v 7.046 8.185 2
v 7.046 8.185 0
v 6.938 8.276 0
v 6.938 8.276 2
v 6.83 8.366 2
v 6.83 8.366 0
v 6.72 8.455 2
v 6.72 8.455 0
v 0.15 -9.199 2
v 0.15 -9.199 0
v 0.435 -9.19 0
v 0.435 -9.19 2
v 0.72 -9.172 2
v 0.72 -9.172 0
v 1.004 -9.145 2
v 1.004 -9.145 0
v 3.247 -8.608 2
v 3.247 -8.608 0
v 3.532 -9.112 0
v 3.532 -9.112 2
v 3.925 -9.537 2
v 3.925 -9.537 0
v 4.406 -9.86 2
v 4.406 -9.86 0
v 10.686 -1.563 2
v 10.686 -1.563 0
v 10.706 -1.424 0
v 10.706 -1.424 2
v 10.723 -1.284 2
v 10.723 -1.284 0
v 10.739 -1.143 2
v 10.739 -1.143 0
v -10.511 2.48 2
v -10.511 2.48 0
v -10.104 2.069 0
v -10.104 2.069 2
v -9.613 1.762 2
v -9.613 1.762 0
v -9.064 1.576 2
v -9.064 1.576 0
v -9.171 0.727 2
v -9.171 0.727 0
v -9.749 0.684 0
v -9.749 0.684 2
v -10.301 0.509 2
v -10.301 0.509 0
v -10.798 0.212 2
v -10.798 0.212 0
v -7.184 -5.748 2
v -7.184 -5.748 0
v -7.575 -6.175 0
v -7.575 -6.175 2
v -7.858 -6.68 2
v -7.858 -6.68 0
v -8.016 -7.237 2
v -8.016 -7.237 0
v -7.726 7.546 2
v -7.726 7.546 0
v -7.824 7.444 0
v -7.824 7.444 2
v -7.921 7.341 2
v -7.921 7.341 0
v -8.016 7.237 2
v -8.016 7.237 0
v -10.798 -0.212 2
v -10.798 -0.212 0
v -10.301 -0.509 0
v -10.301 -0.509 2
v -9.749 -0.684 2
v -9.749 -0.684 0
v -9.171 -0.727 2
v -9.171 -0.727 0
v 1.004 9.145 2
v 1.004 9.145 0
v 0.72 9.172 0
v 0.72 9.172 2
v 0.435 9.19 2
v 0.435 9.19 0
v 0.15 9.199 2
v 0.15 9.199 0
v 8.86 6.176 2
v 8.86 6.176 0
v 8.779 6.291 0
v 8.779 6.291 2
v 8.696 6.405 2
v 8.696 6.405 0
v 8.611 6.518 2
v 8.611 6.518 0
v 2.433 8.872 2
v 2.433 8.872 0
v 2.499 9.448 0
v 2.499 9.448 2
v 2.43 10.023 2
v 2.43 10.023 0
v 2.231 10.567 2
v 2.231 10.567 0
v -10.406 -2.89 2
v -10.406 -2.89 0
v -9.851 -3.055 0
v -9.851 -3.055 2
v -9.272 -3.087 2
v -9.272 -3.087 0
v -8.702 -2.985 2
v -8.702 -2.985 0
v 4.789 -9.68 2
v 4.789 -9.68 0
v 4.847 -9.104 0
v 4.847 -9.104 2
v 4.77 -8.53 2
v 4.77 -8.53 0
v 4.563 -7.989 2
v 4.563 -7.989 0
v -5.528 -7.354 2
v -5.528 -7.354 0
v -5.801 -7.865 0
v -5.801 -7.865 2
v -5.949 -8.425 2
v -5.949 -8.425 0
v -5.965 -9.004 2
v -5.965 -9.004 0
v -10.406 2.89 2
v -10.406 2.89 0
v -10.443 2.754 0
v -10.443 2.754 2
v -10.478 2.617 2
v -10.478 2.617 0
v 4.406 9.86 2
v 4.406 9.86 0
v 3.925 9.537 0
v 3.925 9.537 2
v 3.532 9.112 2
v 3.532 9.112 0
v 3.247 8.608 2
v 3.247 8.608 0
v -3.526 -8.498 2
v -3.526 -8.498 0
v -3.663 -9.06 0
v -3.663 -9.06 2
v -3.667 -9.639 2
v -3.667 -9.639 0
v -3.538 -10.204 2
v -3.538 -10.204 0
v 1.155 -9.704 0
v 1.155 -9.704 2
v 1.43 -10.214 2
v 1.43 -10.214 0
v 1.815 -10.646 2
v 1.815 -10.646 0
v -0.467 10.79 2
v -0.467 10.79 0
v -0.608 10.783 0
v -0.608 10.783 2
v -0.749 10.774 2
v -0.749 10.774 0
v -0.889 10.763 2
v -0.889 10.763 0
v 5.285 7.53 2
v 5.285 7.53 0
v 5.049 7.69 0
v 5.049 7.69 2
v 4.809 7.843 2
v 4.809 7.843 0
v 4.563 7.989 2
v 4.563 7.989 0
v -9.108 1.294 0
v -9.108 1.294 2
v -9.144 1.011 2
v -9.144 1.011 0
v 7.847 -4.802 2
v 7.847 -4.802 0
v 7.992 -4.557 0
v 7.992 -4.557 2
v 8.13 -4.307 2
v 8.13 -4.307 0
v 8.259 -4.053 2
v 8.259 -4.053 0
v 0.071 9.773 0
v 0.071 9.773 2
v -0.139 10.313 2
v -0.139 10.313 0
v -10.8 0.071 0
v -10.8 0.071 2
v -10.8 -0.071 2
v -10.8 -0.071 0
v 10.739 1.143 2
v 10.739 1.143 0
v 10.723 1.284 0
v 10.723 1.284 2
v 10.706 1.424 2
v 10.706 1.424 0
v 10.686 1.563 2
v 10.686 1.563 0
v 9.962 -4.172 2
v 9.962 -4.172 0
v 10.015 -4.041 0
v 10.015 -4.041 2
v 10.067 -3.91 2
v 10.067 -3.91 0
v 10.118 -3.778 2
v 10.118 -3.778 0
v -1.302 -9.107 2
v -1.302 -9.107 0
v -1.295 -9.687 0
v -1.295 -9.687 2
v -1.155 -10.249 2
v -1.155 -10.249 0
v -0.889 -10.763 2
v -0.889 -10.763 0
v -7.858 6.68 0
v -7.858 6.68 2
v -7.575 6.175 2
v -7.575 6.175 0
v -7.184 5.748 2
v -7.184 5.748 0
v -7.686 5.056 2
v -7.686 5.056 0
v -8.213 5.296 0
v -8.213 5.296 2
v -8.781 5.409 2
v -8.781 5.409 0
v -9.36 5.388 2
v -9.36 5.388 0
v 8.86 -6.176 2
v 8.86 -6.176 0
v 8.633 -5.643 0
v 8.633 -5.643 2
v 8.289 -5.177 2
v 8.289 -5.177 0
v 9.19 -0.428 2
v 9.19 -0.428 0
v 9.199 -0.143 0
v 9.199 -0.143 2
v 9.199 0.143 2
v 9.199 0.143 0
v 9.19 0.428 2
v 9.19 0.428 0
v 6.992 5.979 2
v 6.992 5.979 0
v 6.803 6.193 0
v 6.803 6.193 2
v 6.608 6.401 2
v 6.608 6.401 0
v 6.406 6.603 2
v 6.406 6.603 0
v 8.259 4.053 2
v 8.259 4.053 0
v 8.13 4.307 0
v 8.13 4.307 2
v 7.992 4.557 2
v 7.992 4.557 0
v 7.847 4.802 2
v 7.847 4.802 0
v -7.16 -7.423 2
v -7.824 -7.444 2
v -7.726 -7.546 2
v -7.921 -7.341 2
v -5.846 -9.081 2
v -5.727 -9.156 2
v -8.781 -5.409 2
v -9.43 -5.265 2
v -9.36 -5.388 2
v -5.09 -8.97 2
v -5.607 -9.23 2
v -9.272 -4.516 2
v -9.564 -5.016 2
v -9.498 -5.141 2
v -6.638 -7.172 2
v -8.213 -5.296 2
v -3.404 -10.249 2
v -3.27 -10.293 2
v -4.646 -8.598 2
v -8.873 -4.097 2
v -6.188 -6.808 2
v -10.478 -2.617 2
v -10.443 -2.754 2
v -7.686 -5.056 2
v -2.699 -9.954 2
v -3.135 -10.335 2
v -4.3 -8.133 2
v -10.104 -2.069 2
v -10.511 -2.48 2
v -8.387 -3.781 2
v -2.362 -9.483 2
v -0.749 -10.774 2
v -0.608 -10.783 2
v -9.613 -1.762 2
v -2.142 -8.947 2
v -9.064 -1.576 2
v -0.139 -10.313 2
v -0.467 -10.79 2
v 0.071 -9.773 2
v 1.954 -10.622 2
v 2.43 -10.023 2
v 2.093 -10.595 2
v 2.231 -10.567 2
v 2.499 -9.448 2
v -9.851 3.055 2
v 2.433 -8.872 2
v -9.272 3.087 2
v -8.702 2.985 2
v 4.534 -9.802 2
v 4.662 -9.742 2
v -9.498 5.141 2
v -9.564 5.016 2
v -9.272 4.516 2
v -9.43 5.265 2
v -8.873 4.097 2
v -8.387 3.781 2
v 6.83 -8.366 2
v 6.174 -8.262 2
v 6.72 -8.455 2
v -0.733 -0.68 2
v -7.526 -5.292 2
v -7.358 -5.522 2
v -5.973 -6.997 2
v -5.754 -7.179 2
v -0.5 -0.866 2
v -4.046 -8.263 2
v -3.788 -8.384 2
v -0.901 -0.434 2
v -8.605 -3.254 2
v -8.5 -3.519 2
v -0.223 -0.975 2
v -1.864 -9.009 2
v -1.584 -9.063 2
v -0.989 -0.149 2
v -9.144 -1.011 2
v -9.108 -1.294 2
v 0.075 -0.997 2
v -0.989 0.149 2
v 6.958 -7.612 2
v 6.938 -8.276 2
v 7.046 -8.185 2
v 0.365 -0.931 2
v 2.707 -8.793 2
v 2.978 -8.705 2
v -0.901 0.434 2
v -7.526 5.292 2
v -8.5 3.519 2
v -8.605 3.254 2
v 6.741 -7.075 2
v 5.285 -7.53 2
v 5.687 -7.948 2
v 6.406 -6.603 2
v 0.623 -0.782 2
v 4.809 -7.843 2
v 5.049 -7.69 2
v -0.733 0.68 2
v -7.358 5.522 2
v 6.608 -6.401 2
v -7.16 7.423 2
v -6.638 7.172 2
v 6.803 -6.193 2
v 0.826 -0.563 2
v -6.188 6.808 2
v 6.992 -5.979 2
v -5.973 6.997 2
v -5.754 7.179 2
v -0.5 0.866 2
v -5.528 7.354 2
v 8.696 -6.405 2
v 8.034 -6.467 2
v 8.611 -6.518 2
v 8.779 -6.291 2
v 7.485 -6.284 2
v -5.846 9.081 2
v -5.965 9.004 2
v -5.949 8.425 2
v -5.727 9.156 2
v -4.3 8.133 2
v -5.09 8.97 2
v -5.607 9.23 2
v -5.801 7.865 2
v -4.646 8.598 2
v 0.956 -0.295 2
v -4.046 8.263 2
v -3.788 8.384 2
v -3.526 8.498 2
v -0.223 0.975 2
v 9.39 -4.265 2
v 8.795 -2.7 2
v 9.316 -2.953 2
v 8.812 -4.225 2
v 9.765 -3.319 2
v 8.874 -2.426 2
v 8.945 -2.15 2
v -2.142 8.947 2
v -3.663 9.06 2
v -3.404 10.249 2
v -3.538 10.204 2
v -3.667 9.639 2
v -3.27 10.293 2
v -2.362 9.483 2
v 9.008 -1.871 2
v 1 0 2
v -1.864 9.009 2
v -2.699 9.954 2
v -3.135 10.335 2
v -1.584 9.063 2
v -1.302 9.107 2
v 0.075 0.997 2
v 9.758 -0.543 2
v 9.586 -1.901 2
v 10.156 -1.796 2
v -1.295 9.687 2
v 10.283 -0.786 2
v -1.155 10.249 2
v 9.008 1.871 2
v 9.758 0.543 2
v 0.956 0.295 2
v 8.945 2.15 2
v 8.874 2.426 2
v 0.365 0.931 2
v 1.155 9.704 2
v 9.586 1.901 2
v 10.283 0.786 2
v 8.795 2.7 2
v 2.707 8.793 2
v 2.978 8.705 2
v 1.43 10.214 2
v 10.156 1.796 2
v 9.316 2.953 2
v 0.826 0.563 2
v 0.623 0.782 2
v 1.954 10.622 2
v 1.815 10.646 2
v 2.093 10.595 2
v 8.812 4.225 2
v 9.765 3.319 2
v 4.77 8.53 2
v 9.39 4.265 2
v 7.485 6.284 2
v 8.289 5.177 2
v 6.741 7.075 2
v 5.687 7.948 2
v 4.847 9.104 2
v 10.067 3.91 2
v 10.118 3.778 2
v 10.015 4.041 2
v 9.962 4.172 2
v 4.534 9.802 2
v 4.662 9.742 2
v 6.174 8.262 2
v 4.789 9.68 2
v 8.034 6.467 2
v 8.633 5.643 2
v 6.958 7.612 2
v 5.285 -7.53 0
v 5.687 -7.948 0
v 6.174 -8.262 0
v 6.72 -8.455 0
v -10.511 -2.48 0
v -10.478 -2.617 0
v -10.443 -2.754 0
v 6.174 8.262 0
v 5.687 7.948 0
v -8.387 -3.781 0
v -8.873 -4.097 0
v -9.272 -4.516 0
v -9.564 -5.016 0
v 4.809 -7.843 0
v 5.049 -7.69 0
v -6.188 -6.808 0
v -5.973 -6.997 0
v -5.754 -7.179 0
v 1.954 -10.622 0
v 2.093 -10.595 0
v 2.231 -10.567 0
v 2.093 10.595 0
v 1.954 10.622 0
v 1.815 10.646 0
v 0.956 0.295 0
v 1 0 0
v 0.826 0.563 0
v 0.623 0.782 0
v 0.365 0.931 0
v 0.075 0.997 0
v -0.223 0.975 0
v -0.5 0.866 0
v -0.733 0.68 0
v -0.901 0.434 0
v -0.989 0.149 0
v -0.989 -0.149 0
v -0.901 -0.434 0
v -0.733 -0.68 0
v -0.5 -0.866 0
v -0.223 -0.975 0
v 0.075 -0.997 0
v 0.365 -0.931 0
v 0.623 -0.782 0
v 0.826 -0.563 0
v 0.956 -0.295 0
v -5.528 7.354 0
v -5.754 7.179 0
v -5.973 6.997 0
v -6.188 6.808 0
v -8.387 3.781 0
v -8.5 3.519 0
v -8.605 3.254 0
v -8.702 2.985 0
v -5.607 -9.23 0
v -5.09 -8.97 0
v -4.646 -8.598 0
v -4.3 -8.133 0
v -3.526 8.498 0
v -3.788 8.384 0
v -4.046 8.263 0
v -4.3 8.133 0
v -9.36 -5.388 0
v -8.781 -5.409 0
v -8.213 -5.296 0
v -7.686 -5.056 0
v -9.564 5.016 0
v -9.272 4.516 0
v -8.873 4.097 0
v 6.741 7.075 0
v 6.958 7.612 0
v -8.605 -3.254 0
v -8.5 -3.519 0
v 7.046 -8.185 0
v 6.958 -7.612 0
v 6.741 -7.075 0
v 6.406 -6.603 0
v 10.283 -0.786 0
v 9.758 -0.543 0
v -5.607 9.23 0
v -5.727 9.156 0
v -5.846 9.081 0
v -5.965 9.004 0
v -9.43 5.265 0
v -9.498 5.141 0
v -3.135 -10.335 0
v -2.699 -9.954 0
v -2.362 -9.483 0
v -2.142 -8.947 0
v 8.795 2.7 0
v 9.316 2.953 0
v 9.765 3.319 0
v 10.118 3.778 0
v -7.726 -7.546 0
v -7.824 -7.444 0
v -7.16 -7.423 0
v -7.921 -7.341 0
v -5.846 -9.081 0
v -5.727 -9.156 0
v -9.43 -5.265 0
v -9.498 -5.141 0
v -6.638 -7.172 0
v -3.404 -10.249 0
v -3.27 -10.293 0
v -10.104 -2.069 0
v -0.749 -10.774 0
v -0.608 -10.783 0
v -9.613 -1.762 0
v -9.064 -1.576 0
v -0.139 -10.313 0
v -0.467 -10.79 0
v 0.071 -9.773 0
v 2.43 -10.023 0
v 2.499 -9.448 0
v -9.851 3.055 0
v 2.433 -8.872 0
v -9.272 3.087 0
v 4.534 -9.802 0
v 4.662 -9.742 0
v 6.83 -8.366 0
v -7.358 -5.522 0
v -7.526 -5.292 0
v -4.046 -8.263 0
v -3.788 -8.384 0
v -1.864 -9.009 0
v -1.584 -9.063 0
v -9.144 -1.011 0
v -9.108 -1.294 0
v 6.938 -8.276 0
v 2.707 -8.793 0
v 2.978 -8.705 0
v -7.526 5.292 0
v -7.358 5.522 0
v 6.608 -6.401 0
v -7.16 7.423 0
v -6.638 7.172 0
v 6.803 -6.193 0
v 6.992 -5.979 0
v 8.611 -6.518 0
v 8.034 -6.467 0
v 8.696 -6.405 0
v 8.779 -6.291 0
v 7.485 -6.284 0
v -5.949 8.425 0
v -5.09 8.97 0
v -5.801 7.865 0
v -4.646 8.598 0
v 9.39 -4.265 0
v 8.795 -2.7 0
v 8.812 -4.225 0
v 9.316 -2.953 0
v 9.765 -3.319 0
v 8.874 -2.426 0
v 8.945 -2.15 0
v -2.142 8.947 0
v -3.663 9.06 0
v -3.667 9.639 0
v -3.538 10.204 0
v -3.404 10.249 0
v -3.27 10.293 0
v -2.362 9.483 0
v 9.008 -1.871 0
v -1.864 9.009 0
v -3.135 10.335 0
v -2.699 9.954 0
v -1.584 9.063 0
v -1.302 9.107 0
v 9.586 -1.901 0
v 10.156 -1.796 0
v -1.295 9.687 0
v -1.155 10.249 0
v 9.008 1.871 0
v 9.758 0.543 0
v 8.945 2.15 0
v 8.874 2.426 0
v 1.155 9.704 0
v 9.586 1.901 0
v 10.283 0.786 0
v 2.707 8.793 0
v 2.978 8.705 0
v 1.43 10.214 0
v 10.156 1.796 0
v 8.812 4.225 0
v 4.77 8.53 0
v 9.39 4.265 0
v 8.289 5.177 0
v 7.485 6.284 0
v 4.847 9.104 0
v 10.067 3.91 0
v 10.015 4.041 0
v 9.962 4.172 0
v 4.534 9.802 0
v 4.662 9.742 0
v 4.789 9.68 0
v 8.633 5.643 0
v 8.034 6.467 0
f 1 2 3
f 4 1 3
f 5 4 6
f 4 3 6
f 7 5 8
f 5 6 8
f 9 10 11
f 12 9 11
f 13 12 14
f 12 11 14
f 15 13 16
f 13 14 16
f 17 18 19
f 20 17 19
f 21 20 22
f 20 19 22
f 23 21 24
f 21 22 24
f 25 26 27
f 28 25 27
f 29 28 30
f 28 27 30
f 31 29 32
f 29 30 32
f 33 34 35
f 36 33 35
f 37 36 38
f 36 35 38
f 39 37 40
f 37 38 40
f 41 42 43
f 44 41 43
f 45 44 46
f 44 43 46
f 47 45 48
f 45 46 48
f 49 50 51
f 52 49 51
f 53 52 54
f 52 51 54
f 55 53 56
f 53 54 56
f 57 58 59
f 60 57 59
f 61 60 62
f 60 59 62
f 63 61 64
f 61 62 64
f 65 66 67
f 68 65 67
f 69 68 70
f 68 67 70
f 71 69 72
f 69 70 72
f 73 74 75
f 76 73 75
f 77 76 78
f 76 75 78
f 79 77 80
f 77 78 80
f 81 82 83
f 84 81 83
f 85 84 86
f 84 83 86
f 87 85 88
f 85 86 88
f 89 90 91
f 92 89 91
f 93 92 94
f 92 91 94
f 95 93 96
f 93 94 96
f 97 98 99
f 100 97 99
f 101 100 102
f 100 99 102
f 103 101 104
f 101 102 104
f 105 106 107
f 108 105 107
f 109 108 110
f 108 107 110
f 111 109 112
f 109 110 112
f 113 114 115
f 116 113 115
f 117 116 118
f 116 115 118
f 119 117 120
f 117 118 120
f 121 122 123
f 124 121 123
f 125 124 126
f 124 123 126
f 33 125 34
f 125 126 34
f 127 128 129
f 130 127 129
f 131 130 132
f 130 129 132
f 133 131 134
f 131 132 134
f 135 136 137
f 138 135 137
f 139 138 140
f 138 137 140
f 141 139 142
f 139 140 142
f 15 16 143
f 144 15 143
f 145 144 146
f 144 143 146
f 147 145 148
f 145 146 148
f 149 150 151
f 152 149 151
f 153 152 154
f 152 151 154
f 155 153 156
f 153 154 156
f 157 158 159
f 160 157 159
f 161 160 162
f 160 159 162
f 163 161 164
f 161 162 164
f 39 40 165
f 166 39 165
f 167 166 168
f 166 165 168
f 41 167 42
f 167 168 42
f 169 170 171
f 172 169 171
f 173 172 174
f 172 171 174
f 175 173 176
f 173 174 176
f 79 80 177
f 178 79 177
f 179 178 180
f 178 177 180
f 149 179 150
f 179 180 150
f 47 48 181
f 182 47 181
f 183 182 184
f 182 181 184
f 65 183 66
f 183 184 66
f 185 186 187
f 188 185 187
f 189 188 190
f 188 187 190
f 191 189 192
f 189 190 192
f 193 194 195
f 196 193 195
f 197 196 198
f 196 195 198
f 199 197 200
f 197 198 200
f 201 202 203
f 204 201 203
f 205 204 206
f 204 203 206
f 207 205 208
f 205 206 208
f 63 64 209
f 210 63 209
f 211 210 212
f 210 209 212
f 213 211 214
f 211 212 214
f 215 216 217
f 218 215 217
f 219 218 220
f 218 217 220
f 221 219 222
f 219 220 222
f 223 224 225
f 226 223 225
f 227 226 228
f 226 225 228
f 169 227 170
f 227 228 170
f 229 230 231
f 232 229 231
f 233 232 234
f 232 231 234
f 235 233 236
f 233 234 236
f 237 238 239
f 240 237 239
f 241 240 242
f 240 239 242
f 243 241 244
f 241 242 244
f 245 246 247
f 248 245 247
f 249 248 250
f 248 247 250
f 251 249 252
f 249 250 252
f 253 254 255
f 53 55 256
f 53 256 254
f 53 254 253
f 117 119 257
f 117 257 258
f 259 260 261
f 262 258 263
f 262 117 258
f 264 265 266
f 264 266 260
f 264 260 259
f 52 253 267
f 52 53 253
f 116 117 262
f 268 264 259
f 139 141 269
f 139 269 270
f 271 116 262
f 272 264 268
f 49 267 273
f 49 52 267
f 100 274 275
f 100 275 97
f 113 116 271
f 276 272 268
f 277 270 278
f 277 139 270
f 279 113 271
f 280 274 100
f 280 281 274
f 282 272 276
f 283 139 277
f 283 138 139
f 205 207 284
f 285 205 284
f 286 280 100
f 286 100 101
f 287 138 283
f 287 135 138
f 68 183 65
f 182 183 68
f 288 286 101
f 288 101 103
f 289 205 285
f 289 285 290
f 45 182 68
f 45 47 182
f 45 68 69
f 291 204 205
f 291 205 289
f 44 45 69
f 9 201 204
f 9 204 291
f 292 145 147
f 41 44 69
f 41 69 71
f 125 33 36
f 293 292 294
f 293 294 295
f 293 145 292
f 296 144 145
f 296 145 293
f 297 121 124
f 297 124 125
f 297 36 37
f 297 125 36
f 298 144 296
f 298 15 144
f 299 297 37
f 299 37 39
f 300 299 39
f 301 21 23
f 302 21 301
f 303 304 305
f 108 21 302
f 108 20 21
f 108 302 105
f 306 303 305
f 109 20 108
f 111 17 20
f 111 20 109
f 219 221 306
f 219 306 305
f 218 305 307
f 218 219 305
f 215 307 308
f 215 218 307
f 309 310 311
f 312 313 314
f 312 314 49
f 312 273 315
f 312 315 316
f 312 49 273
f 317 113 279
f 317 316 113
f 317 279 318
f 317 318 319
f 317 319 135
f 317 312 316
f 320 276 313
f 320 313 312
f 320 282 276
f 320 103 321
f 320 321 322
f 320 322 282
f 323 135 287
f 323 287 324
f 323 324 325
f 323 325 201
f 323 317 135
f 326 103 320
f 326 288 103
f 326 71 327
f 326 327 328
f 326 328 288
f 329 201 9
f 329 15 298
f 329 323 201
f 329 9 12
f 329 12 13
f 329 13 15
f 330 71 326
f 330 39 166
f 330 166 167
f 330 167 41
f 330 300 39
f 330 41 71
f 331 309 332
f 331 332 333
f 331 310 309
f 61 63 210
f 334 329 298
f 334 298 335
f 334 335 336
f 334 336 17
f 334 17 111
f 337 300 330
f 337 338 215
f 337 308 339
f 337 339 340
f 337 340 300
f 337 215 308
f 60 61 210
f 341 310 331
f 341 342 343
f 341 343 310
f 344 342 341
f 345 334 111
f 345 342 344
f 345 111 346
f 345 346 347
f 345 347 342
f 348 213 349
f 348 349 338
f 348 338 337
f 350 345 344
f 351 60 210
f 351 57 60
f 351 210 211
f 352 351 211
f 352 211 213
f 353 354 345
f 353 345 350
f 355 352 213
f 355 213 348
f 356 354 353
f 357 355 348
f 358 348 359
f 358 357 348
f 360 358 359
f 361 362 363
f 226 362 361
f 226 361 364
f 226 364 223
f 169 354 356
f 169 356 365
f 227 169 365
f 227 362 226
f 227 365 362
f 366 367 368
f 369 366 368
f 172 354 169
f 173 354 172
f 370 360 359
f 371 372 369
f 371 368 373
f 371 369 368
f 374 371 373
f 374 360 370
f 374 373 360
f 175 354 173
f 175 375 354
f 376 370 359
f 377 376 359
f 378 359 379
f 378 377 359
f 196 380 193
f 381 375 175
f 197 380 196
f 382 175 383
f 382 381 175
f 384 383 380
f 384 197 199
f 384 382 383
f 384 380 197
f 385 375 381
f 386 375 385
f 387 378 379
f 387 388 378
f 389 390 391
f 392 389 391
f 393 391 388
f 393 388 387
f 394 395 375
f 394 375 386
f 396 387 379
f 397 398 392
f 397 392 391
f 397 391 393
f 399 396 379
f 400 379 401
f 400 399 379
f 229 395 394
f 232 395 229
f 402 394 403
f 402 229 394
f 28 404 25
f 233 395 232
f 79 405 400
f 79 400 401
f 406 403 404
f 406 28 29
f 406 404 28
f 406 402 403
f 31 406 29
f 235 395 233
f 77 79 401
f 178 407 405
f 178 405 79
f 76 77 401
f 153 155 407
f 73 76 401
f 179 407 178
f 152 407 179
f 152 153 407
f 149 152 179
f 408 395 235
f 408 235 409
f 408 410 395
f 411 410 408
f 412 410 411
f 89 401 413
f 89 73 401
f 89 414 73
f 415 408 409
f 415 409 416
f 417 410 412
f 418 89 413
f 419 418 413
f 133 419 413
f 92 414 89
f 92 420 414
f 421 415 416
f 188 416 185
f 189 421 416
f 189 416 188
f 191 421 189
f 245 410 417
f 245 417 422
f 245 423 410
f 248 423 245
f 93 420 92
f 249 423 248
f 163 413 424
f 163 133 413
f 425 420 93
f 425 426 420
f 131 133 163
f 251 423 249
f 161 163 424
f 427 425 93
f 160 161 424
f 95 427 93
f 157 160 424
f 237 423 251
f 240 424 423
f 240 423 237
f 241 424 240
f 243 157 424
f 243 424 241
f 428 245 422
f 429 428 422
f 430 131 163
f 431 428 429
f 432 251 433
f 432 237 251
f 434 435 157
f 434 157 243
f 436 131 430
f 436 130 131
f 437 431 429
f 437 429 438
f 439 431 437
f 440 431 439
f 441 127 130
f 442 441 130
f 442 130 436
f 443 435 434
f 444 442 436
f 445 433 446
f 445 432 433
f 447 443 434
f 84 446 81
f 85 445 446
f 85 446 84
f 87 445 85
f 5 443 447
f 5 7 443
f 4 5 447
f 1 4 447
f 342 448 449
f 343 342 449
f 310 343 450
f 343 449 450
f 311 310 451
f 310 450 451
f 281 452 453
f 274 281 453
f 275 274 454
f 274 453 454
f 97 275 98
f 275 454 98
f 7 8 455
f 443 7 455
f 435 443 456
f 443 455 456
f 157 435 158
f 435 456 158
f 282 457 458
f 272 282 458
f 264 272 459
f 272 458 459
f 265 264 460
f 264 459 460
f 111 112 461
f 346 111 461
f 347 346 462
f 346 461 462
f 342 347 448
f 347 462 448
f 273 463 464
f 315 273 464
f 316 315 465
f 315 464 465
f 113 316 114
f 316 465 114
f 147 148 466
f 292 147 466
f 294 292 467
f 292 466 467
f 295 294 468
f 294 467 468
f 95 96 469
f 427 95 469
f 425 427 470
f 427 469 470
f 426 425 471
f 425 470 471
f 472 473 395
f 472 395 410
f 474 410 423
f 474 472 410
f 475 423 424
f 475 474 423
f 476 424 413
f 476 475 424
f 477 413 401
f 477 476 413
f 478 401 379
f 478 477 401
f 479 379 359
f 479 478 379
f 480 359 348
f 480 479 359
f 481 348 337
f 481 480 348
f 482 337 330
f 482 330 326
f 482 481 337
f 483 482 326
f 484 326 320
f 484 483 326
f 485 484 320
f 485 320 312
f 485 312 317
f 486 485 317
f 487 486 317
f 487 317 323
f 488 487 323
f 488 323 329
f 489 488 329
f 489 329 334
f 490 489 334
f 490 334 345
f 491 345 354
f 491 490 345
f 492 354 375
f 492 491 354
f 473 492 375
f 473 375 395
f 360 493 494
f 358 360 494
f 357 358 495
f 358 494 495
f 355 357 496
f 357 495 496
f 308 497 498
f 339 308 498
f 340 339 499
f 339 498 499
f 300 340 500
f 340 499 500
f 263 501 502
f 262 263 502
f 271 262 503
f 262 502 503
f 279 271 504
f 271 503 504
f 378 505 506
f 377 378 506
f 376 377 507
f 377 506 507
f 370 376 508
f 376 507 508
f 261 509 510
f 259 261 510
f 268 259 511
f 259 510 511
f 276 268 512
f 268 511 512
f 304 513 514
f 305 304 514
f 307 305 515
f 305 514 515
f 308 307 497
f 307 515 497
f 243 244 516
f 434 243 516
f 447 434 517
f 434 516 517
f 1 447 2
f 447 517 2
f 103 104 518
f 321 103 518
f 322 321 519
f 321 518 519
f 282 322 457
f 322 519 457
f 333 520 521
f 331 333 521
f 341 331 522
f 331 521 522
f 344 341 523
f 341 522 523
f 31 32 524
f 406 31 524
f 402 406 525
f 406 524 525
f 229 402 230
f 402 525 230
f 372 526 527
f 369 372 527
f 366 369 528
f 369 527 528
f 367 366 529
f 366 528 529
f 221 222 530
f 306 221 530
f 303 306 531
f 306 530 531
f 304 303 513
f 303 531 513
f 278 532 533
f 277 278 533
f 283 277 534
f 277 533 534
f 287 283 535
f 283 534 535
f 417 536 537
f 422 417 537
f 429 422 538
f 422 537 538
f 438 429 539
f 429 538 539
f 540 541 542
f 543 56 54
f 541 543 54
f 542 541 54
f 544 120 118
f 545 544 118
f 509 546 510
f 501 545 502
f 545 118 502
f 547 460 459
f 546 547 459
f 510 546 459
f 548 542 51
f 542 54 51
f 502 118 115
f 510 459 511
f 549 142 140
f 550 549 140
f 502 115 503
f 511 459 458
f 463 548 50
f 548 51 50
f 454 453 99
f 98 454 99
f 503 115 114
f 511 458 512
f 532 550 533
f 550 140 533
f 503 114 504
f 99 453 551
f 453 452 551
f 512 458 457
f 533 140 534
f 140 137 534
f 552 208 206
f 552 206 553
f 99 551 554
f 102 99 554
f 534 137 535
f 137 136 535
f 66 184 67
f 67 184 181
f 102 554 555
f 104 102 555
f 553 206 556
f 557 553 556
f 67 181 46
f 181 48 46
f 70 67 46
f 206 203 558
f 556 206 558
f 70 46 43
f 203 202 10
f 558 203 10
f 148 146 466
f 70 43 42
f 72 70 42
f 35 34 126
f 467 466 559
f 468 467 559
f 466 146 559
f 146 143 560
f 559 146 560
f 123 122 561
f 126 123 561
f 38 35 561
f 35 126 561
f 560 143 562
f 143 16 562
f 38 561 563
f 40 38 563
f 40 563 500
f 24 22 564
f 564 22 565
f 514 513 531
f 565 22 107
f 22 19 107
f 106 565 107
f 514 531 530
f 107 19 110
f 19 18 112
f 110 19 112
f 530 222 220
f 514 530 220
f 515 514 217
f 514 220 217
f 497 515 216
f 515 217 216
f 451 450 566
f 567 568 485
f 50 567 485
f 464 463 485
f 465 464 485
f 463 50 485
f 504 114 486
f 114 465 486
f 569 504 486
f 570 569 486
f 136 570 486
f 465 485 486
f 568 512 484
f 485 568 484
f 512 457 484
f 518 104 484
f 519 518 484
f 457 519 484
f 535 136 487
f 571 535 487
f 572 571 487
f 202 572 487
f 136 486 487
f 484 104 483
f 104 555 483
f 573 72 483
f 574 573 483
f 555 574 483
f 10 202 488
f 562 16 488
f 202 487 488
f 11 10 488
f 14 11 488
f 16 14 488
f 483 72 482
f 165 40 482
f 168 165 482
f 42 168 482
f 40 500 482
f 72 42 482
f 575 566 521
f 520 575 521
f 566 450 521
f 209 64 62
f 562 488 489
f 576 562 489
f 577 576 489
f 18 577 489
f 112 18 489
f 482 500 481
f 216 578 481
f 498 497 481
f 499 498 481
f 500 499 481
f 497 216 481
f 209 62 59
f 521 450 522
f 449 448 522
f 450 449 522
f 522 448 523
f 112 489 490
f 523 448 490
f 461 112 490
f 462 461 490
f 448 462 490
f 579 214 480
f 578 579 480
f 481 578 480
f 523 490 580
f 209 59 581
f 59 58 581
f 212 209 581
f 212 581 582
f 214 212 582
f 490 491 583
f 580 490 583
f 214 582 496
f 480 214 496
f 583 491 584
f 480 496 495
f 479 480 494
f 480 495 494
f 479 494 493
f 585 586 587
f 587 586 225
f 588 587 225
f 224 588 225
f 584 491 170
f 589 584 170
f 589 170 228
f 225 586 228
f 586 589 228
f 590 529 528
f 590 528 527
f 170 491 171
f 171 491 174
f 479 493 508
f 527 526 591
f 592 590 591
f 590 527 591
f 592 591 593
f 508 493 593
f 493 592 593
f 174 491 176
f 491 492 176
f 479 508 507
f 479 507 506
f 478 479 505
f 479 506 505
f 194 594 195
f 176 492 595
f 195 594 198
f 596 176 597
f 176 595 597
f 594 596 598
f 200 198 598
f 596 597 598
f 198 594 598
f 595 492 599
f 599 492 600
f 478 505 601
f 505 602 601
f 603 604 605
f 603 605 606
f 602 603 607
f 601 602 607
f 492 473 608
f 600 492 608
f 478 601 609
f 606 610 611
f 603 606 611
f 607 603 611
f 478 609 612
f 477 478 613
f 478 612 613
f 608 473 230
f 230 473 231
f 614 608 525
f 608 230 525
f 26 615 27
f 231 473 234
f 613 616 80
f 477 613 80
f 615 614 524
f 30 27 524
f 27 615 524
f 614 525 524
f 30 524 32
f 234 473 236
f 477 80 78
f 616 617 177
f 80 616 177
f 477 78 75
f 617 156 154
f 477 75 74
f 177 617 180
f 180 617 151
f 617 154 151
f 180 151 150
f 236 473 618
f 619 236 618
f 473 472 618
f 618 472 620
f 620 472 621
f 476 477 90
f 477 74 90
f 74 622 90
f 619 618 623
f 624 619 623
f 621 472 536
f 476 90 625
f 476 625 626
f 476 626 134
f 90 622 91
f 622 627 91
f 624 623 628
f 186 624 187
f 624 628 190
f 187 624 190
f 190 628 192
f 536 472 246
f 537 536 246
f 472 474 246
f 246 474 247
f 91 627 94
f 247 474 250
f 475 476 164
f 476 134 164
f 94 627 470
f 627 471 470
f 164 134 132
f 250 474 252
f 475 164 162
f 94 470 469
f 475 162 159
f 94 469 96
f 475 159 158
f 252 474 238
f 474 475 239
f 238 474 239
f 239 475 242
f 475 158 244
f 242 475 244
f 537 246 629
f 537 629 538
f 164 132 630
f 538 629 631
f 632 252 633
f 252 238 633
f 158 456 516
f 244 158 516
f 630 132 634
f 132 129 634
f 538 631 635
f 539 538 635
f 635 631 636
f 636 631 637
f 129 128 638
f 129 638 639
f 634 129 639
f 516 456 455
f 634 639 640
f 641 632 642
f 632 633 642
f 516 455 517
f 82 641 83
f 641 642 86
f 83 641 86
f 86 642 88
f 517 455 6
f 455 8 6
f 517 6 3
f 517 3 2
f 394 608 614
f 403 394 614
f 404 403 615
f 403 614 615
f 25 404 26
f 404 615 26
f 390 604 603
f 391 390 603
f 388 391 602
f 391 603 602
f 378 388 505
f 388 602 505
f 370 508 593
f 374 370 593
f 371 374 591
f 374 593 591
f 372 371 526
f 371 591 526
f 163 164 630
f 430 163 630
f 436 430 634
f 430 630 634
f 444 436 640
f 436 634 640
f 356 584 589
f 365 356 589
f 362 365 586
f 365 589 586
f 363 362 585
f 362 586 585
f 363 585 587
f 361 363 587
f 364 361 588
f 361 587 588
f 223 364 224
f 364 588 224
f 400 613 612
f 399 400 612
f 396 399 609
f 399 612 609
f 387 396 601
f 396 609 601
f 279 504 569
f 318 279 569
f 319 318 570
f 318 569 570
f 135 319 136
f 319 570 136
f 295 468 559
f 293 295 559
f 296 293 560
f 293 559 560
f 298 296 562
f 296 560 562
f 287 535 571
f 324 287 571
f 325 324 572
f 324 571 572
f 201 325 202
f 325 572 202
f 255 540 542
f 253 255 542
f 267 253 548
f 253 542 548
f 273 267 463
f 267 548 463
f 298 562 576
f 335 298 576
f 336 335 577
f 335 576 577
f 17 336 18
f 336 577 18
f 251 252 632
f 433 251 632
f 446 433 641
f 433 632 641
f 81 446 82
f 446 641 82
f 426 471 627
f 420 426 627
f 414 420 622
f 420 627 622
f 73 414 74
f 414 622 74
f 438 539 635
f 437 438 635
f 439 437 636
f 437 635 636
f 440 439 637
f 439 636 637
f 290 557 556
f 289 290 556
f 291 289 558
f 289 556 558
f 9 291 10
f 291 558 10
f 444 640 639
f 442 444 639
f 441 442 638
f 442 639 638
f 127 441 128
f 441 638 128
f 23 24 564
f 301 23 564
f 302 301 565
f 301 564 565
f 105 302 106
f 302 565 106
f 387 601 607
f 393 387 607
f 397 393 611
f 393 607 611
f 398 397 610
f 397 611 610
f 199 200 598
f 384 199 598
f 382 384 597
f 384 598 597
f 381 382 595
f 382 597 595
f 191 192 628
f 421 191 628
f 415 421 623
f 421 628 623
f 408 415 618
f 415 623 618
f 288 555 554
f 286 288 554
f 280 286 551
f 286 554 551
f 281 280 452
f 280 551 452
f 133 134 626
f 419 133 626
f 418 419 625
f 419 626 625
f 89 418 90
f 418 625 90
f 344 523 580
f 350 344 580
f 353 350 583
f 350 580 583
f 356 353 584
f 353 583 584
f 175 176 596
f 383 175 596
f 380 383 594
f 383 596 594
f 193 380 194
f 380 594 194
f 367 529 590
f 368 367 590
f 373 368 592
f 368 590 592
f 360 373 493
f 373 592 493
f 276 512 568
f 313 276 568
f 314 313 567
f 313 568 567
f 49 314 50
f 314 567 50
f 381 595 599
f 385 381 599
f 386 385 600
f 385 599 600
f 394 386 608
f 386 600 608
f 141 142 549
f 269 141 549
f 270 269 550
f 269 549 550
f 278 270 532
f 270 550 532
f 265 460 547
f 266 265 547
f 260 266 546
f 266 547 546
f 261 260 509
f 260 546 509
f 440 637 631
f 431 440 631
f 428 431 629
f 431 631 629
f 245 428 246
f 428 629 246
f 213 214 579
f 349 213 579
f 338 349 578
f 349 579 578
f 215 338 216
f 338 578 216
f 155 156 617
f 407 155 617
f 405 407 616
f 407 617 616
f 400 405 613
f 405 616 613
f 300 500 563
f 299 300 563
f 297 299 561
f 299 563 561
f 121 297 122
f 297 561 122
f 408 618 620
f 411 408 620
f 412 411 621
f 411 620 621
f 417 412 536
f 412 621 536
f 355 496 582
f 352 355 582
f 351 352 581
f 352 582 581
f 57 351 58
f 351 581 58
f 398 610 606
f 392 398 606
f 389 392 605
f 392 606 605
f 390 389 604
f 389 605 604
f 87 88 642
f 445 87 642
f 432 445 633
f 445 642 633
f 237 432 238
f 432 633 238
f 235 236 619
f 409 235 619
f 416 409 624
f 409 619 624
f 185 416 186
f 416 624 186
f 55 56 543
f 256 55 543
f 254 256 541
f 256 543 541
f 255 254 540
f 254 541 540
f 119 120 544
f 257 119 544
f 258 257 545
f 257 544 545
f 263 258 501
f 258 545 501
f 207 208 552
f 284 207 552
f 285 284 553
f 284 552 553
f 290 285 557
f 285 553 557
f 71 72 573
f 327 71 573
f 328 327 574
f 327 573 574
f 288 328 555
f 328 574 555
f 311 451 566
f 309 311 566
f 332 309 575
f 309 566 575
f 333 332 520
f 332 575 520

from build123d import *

# Parameters (mm, degrees)
F0_R     = 1
F1_DEPTH = 2


with BuildPart() as f1:
    # F0 (on Top) → F1 (new body)
    with BuildSketch(Plane.XY):
        with BuildLine():
            ThreePointArc((1.003907, 9.145063), (0.577673, 9.181846), (0.150189, 9.198774))
            ThreePointArc((0.150189, 9.198774), (-0.018265, 10.048606), (-0.466655, 10.789913))
            ThreePointArc((-0.466655, 10.789913), (-0.678138, 10.778689), (-0.889359, 10.763319))
            ThreePointArc((-0.889359, 10.763319), (-1.241303, 9.971659), (-1.301917, 9.107415))
            ThreePointArc((-1.301917, 9.107415), (-1.723908, 9.037043), (-2.142172, 8.947128))
            ThreePointArc((-2.142172, 8.947128), (-2.516678, 9.728368), (-3.135337, 10.334876))
            ThreePointArc((-3.135337, 10.334876), (-3.337384, 10.27141), (-3.538147, 10.203995))
            ThreePointArc((-3.538147, 10.203995), (-3.682156, 9.349681), (-3.525937, 8.497516))
            ThreePointArc((-3.525937, 8.497516), (-3.917169, 8.324409), (-4.299932, 8.133301))
            ThreePointArc((-4.299932, 8.133301), (-4.856958, 8.796861), (-5.607013, 9.23046))
            ThreePointArc((-5.607013, 9.23046), (-5.786929, 9.118742), (-5.96462, 9.003516))
            ThreePointArc((-5.96462, 9.003516), (-5.891646, 8.140229), (-5.528409, 7.353686))
            ThreePointArc((-5.528409, 7.353686), (-5.864301, 7.088722), (-6.187511, 6.808429))
            ThreePointArc((-6.187511, 6.808429), (-6.892059, 7.312615), (-7.726381, 7.546061))
            ThreePointArc((-7.726381, 7.546061), (-7.872861, 7.393109), (-8.016314, 7.237314))
            ThreePointArc((-8.016314, 7.237314), (-7.730941, 6.419296), (-7.183511, 5.747797))
            ThreePointArc((-7.183511, 5.747797), (-7.442956, 5.407624), (-7.686307, 5.055758))
            ThreePointArc((-7.686307, 5.055758), (-8.494105, 5.368891), (-9.360272, 5.387515))
            ThreePointArc((-9.360272, 5.387515), (-9.464112, 5.20294), (-9.564314, 5.016364))
            ThreePointArc((-9.564314, 5.016364), (-9.084474, 4.295015), (-8.387247, 3.780752))
            ThreePointArc((-8.387247, 3.780752), (-8.553944, 3.386746), (-8.702143, 2.985416))
            ThreePointArc((-8.702143, 2.985416), (-9.562436, 3.087819), (-10.406022, 2.890451))
            ThreePointArc((-10.406022, 2.890451), (-10.460698, 2.685851), (-10.511352, 2.480218))
            ThreePointArc((-10.511352, 2.480218), (-9.867195, 1.900862), (-9.063981, 1.57615))
            ThreePointArc((-9.063981, 1.57615), (-9.127455, 1.153066), (-9.171192, 0.727488))
            ThreePointArc((-9.171192, 0.727488), (-10.029924, 0.612728), (-10.797924, 0.21177))
            ThreePointArc((-10.797924, 0.21177), (-10.8, 0), (-10.797924, -0.21177))
            ThreePointArc((-10.797924, -0.21177), (-10.029924, -0.612728), (-9.171192, -0.727488))
            ThreePointArc((-9.171192, -0.727488), (-9.127455, -1.153066), (-9.063981, -1.57615))
            ThreePointArc((-9.063981, -1.57615), (-9.867195, -1.900862), (-10.511352, -2.480218))
            ThreePointArc((-10.511352, -2.480218), (-10.460698, -2.685851), (-10.406022, -2.890451))
            ThreePointArc((-10.406022, -2.890451), (-9.562436, -3.087819), (-8.702143, -2.985416))
            ThreePointArc((-8.702143, -2.985416), (-8.553944, -3.386746), (-8.387247, -3.780752))
            ThreePointArc((-8.387247, -3.780752), (-9.084474, -4.295015), (-9.564314, -5.016364))
            ThreePointArc((-9.564314, -5.016364), (-9.464112, -5.20294), (-9.360272, -5.387515))
            ThreePointArc((-9.360272, -5.387515), (-8.494105, -5.368891), (-7.686307, -5.055758))
            ThreePointArc((-7.686307, -5.055758), (-7.442956, -5.407624), (-7.183511, -5.747797))
            ThreePointArc((-7.183511, -5.747797), (-7.730941, -6.419296), (-8.016314, -7.237314))
            ThreePointArc((-8.016314, -7.237314), (-7.872861, -7.393109), (-7.726381, -7.546061))
            ThreePointArc((-7.726381, -7.546061), (-6.892059, -7.312615), (-6.187511, -6.808429))
            ThreePointArc((-6.187511, -6.808429), (-5.864301, -7.088722), (-5.528409, -7.353686))
            ThreePointArc((-5.528409, -7.353686), (-5.891646, -8.140229), (-5.96462, -9.003516))
            ThreePointArc((-5.96462, -9.003516), (-5.786929, -9.118742), (-5.607013, -9.23046))
            ThreePointArc((-5.607013, -9.23046), (-4.856958, -8.796861), (-4.299932, -8.133301))
            ThreePointArc((-4.299932, -8.133301), (-3.917169, -8.324409), (-3.525937, -8.497516))
            ThreePointArc((-3.525937, -8.497516), (-3.682156, -9.349681), (-3.538147, -10.203995))
            ThreePointArc((-3.538147, -10.203995), (-3.337384, -10.27141), (-3.135337, -10.334876))
            ThreePointArc((-3.135337, -10.334876), (-2.516678, -9.728368), (-2.142172, -8.947128))
            ThreePointArc((-2.142172, -8.947128), (-1.723908, -9.037043), (-1.301917, -9.107415))
            ThreePointArc((-1.301917, -9.107415), (-1.241303, -9.971659), (-0.889359, -10.763319))
            ThreePointArc((-0.889359, -10.763319), (-0.678138, -10.778689), (-0.466655, -10.789913))
            ThreePointArc((-0.466655, -10.789913), (-0.018265, -10.048606), (0.150189, -9.198774))
            ThreePointArc((0.150189, -9.198774), (0.577673, -9.181846), (1.003907, -9.145063))
            ThreePointArc((1.003907, -9.145063), (1.277545, -9.96708), (1.81531, -10.646344))
            ThreePointArc((1.81531, -10.646344), (2.023718, -10.608702), (2.231348, -10.566981))
            ThreePointArc((2.231348, -10.566981), (2.481296, -9.737453), (2.433113, -8.872427))
            ThreePointArc((2.433113, -8.872427), (2.842956, -8.74972), (3.246652, -8.608092))
            ThreePointArc((3.246652, -8.608092), (3.716121, -9.336234), (4.405917, -9.860421))
            ThreePointArc((4.405917, -9.860421), (4.598416, -9.772132), (4.789147, -9.680086))
            ThreePointArc((4.789147, -9.680086), (4.824947, -8.81446), (4.563155, -7.988593))
            ThreePointArc((4.563155, -7.988593), (4.929607, -7.767817), (5.285398, -7.530243))
            ThreePointArc((5.285398, -7.530243), (5.921199, -8.118757), (6.719684, -8.45493))
            ThreePointArc((6.719684, -8.45493), (6.884179, -8.321543), (7.046027, -8.184956))
            ThreePointArc((7.046027, -8.184956), (6.865429, -7.337622), (6.406477, -6.602806))
            ThreePointArc((6.406477, -6.602806), (6.706511, -6.297833), (6.992043, -5.979242))
            ThreePointArc((6.992043, -5.979242), (7.754226, -6.391149), (8.611228, -6.518186))
            ThreePointArc((8.611228, -6.518186), (8.737384, -6.348081), (8.860179, -6.175535))
            ThreePointArc((8.860179, -6.175535), (8.474532, -5.399734), (7.847257, -4.802141))
            ThreePointArc((7.847257, -4.802141), (8.062021, -4.432134), (8.259352, -4.052543))
            ThreePointArc((8.259352, -4.052543), (9.100027, -4.261962), (9.961698, -4.17188))
            ThreePointArc((9.961698, -4.17188), (10.041586, -3.975745), (10.117613, -3.778082))
            ThreePointArc((10.117613, -3.778082), (9.551148, -3.122561), (8.794965, -2.699739))
            ThreePointArc((8.794965, -2.699739), (8.910965, -2.287947), (9.007696, -1.871207))
            ThreePointArc((9.007696, -1.871207), (9.87404, -1.86498), (10.686237, -1.563439))
            ThreePointArc((10.686237, -1.563439), (10.714839, -1.353599), (10.739321, -1.143239))
            ThreePointArc((10.739321, -1.143239), (10.02763, -0.649186), (9.190053, -0.427703))
            ThreePointArc((9.190053, -0.427703), (9.2, 0), (9.190053, 0.427703))
            ThreePointArc((9.190053, 0.427703), (10.02763, 0.649186), (10.739321, 1.143239))
            ThreePointArc((10.739321, 1.143239), (10.714839, 1.353599), (10.686237, 1.563439))
            ThreePointArc((10.686237, 1.563439), (9.87404, 1.86498), (9.007696, 1.871207))
            ThreePointArc((9.007696, 1.871207), (8.910965, 2.287947), (8.794965, 2.699739))
            ThreePointArc((8.794965, 2.699739), (9.551148, 3.122561), (10.117613, 3.778082))
            ThreePointArc((10.117613, 3.778082), (10.041586, 3.975745), (9.961698, 4.17188))
            ThreePointArc((9.961698, 4.17188), (9.100027, 4.261962), (8.259352, 4.052543))
            ThreePointArc((8.259352, 4.052543), (8.062021, 4.432134), (7.847257, 4.802141))
            ThreePointArc((7.847257, 4.802141), (8.474532, 5.399734), (8.860179, 6.175535))
            ThreePointArc((8.860179, 6.175535), (8.737384, 6.348081), (8.611228, 6.518186))
            ThreePointArc((8.611228, 6.518186), (7.754226, 6.391149), (6.992043, 5.979242))
            ThreePointArc((6.992043, 5.979242), (6.706511, 6.297833), (6.406477, 6.602806))
            ThreePointArc((6.406477, 6.602806), (6.865429, 7.337622), (7.046027, 8.184956))
            ThreePointArc((7.046027, 8.184956), (6.884179, 8.321543), (6.719684, 8.45493))
            ThreePointArc((6.719684, 8.45493), (5.921199, 8.118757), (5.285398, 7.530243))
            ThreePointArc((5.285398, 7.530243), (4.929607, 7.767817), (4.563155, 7.988593))
            ThreePointArc((4.563155, 7.988593), (4.824947, 8.81446), (4.789147, 9.680086))
            ThreePointArc((4.789147, 9.680086), (4.598416, 9.772132), (4.405917, 9.860421))
            ThreePointArc((4.405917, 9.860421), (3.716121, 9.336234), (3.246652, 8.608092))
            ThreePointArc((3.246652, 8.608092), (2.842956, 8.74972), (2.433113, 8.872427))
            ThreePointArc((2.433113, 8.872427), (2.481296, 9.737453), (2.231348, 10.566981))
            ThreePointArc((2.231348, 10.566981), (2.023718, 10.608702), (1.81531, 10.646344))
            ThreePointArc((1.81531, 10.646344), (1.277545, 9.96708), (1.003907, 9.145063))
        make_face()
        Circle(F0_R, mode=Mode.SUBTRACT)
    extrude(amount=F1_DEPTH)


solid = f1.part
